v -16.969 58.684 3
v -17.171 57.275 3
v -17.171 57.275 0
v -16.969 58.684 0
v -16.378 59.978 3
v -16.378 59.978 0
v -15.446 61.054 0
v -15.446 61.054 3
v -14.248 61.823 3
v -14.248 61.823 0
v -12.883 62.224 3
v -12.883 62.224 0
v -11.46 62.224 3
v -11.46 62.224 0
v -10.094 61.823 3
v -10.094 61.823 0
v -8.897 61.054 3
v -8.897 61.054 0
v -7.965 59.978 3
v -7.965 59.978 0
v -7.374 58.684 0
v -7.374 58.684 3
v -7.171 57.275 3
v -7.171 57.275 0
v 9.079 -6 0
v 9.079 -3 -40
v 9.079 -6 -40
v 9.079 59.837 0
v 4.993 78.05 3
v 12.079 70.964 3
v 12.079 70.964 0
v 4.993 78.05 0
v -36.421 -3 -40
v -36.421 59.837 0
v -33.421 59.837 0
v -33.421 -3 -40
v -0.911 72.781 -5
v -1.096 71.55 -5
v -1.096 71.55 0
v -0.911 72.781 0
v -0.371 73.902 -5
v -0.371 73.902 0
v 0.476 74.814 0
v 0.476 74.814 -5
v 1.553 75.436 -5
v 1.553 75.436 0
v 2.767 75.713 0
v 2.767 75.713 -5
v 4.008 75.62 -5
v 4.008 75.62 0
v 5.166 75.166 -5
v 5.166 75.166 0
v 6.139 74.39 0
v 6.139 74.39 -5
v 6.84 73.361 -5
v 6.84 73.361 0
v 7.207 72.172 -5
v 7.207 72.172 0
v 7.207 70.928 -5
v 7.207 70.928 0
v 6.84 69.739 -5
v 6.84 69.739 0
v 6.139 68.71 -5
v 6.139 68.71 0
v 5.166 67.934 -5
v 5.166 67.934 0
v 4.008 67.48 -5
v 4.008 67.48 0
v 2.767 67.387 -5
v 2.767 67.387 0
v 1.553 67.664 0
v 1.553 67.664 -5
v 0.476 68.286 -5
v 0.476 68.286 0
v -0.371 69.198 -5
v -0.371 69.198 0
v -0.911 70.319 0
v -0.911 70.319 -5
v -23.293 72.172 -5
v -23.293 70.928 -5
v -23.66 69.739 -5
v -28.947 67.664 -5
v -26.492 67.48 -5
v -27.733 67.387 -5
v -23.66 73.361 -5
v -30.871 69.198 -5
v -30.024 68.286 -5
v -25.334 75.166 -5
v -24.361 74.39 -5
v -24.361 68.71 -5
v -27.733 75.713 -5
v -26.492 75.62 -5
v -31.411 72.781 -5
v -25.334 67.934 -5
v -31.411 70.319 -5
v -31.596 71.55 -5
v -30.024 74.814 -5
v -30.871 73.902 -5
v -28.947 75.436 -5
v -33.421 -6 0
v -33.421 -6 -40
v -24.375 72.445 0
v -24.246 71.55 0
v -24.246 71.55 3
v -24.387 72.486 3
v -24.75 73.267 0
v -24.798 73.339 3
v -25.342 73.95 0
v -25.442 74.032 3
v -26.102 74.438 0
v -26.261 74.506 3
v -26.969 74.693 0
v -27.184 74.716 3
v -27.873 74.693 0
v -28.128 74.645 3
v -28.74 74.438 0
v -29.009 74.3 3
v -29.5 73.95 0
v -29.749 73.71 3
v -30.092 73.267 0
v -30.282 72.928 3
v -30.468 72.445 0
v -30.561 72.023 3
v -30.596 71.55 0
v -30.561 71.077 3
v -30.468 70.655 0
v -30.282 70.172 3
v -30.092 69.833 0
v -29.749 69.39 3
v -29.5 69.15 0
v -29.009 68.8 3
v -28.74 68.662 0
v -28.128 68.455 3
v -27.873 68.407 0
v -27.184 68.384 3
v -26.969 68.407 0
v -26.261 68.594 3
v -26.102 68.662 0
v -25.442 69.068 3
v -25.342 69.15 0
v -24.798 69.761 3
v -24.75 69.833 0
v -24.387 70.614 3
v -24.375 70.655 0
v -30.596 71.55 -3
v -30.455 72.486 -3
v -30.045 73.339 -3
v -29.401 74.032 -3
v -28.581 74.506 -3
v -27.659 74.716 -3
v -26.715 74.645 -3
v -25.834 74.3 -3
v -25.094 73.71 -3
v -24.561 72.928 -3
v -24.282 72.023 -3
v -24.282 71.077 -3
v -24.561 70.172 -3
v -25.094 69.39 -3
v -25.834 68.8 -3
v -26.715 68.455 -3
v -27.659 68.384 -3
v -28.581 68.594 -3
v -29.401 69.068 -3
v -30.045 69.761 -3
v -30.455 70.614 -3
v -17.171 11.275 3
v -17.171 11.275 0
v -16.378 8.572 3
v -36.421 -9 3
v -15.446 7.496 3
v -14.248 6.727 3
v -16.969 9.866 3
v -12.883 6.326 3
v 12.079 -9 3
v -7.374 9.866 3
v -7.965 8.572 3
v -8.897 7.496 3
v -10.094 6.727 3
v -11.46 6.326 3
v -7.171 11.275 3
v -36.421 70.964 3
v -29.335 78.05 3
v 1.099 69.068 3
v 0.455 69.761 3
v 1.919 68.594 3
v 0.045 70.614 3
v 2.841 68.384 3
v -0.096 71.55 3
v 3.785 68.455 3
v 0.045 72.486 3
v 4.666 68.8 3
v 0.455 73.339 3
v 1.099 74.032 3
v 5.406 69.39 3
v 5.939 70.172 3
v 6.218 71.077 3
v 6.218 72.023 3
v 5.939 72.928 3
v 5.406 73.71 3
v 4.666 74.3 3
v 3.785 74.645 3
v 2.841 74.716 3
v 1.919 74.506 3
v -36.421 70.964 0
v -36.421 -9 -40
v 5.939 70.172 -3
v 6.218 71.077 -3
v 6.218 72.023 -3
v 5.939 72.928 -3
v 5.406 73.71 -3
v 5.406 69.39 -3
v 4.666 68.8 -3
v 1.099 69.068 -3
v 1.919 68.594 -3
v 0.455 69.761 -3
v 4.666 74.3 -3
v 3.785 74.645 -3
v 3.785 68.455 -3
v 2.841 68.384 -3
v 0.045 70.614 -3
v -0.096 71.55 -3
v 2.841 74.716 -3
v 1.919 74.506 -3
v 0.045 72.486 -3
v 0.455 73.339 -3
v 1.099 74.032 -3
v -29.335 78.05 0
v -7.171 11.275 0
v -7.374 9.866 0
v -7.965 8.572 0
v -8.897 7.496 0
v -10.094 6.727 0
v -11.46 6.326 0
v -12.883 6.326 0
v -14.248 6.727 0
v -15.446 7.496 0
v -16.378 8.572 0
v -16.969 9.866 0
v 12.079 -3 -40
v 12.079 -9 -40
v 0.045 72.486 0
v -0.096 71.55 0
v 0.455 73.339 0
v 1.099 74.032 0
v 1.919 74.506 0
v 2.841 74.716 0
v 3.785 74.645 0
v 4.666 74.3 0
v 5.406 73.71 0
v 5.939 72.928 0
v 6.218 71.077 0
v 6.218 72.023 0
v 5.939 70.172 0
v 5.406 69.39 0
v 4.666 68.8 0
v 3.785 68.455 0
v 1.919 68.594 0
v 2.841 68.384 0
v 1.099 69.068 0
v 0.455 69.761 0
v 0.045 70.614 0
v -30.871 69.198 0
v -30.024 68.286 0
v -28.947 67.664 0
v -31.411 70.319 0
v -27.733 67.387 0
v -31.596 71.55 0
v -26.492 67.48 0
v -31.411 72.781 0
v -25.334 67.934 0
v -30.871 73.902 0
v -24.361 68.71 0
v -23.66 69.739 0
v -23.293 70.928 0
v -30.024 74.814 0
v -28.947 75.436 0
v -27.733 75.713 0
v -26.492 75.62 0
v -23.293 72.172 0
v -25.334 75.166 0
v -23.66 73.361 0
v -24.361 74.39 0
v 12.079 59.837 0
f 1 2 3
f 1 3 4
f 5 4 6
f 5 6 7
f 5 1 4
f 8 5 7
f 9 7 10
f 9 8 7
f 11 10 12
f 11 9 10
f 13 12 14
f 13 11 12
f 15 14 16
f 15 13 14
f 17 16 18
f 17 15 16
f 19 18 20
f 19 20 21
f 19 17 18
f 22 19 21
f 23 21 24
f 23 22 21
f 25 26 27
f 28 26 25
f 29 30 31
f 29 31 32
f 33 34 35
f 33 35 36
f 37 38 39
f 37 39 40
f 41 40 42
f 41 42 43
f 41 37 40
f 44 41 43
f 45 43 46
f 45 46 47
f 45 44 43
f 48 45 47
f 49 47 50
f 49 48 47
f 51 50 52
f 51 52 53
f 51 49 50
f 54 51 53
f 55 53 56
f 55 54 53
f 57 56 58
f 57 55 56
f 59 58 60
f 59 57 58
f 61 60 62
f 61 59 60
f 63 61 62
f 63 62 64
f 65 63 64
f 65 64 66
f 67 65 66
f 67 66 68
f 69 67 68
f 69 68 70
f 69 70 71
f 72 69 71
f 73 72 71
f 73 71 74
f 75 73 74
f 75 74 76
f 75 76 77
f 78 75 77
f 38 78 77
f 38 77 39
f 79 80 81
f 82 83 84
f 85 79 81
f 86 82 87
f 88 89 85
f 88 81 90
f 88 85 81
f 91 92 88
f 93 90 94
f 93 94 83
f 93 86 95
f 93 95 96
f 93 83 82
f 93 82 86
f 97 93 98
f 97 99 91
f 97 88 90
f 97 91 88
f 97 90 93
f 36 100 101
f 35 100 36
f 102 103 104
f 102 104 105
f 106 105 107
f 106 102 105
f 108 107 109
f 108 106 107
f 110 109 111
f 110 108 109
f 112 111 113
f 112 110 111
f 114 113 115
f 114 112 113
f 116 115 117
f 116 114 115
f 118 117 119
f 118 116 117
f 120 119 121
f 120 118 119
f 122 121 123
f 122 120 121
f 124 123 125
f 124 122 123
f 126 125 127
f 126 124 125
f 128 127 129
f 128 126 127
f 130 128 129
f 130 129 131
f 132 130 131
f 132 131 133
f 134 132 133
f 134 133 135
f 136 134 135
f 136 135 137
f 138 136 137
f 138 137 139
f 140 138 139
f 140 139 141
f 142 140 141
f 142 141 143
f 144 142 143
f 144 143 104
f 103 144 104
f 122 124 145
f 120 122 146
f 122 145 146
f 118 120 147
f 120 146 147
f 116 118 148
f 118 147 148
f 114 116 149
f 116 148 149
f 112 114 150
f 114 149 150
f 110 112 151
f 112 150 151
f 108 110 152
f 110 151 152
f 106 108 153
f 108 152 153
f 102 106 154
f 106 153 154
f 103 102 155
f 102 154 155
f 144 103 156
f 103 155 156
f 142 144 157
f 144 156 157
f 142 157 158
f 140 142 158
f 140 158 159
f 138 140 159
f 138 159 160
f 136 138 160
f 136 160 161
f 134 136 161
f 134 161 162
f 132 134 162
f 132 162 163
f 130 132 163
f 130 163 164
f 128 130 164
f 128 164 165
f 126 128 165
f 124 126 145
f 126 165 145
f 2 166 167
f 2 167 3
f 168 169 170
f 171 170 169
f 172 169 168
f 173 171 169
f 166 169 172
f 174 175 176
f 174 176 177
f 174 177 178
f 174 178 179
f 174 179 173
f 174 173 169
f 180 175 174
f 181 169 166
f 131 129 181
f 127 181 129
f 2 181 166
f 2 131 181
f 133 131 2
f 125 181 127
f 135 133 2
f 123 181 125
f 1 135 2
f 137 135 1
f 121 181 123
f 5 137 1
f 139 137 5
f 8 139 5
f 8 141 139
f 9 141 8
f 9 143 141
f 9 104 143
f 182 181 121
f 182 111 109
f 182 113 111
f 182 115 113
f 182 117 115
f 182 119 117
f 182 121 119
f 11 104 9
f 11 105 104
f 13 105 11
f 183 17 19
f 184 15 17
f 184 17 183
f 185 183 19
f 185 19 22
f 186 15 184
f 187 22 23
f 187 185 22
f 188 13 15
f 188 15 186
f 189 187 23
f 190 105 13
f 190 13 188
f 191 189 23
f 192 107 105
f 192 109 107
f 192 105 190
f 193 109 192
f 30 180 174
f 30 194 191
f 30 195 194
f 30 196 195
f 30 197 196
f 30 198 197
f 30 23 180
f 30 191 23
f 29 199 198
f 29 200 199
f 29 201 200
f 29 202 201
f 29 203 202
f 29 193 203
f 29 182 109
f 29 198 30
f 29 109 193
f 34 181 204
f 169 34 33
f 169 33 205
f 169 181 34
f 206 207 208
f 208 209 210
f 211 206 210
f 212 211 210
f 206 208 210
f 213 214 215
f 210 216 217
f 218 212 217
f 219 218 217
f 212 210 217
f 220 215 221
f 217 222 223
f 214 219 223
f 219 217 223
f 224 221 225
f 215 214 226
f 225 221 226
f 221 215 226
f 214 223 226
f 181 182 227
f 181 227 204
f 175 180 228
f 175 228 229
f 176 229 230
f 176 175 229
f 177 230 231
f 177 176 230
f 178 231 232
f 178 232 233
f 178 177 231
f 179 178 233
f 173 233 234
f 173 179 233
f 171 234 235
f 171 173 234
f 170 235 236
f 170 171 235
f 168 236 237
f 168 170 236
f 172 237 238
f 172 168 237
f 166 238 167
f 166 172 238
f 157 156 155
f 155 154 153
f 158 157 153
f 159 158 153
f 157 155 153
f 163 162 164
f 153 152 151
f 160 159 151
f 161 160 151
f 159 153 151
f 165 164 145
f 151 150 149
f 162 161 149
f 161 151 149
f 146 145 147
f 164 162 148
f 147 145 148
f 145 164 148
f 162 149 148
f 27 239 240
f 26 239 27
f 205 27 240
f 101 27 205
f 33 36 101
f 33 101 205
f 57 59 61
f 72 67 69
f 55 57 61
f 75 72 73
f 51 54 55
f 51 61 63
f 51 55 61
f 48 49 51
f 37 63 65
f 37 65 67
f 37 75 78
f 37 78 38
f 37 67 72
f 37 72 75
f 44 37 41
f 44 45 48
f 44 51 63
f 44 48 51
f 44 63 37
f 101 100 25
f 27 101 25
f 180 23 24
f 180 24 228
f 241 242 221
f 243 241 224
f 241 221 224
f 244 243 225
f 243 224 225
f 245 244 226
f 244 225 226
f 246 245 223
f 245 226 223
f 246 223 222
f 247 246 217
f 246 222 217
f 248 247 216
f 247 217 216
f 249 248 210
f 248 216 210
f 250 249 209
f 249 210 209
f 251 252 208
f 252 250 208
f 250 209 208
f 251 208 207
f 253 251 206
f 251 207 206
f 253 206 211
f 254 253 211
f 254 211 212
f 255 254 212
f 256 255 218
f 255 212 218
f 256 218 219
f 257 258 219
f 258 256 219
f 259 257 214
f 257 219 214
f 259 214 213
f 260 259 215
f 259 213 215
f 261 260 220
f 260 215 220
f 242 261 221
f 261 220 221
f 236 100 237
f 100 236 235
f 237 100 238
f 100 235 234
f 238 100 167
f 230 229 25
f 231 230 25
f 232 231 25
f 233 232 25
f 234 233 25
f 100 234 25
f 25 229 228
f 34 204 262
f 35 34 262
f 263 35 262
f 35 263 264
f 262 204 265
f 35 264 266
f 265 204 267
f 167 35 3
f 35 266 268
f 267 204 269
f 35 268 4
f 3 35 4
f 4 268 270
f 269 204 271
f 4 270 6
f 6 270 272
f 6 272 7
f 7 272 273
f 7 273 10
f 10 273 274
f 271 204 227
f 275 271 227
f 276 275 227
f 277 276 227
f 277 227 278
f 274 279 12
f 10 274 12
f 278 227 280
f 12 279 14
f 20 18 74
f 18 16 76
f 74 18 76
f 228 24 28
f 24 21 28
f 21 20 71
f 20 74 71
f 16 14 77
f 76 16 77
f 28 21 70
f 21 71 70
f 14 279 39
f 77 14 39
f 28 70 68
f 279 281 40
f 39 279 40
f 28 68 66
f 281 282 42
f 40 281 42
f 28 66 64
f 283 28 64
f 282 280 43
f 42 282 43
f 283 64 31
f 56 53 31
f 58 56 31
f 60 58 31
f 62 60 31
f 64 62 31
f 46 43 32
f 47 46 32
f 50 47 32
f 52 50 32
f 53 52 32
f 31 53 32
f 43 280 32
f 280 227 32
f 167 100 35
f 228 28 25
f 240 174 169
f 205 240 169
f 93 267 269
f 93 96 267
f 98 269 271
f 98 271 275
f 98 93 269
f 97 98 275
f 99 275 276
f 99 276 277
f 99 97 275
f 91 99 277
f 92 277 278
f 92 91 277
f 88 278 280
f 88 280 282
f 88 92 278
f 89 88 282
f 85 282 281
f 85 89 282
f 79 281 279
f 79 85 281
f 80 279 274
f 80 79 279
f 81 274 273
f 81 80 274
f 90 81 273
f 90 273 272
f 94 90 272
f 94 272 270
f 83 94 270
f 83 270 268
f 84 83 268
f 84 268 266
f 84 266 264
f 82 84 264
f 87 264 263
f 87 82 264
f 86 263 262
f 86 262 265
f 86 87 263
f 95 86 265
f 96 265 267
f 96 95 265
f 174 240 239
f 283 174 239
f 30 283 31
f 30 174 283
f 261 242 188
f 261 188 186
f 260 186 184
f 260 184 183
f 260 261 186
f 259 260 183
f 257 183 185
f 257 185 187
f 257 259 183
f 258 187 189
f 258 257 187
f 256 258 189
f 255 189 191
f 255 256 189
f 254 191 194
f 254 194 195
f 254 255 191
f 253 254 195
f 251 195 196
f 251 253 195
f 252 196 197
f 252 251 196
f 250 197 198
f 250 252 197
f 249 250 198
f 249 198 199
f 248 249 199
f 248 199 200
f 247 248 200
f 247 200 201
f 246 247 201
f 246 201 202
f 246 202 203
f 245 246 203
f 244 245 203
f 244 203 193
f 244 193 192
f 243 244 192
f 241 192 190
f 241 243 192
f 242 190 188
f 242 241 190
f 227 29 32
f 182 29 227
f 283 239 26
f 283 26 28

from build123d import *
from build123d.topology import SkipClean

# Parameters (mm, degrees)
SKETCH1_R                = 1.55
SKETCH1_R_2              = 1.5
SKETCH1_R_3              = 11
SKETCH1_R_4              = 3.175
BOSS_EXTRUDE1_DEPTH      = 3
BOSS_EXTRUDE2_START      = 3
SKETCH2_R                = 4.175
SKETCH2_R_2              = 3.175
BOSS_EXTRUDE2_DEPTH      = 3
BOSS_EXTRUDE3_START      = 2
SKETCH3_R                = 4.175
BOSS_EXTRUDE3_DEPTH      = 2
BOSS_EXTRUDE4_DEPTH      = 40
BOSS_EXTRUDE4_DEPTH_BACK = 3
SKETCH5_W                = 3
SKETCH5_H                = 5
BOSS_EXTRUDE5_DEPTH      = 3
BOSS_EXTRUDE7_DEPTH      = 3
BOSS_EXTRUDE9_DEPTH      = 3
BOSS_EXTRUDE10_START     = -3
SKETCH9_R                = 1.55
SKETCH9_R_2              = 1.5
SKETCH9_R_3              = 11
BOSS_EXTRUDE10_DEPTH     = 3
CUT_EXTRUDE1_DEPTH       = 3
SKETCH11_W               = 3
SKETCH11_H               = 75.55
BOSS_EXTRUDE11_DEPTH     = 3
CHAMFER1_SIZE            = 3
BOSS_EXTRUDE12_DEPTH     = 3
BOSS_EXTRUDE13_DEPTH     = 3
BOSS_EXTRUDE14_DEPTH     = 3


with BuildPart() as part:
    # Sketch1 → Boss-Extrude1 (new body)
    with BuildSketch(Plane.XY):
        Polygon((-33.421286346, -6), (-33.421286346, 36.5), (-33.421286346, 72.55), (-28.421286346, 77.55), (4.078713654, 77.55), (9.078713654, 72.55), (9.078713654, 36.5), (9.078713654, -6), align=None)
        with Locations((2.92772434, 30.5)):
            Circle(SKETCH1_R, mode=Mode.SUBTRACT)
        with Locations(Location((2.92772434, -0.5, 0), (0, 0, 180))):
            Circle(SKETCH1_R_2, mode=Mode.SUBTRACT)
        with Locations((-27.671286346, -0.5)):
            Circle(SKETCH1_R_2, mode=Mode.SUBTRACT)
        with Locations(Location((-28.07227566, 30.5, 0), (0, 0, 180))):
            Circle(SKETCH1_R_2, mode=Mode.SUBTRACT)
        with Locations((-12.171286346, 15.25)):
            Circle(SKETCH1_R_3, mode=Mode.SUBTRACT)
        with Locations((-27.421286346, 71.55)):
            Circle(SKETCH1_R_4, mode=Mode.SUBTRACT)
        with Locations(Location((3.078713654, 71.55, 0), (0, 0, 180))):
            Circle(SKETCH1_R_4, mode=Mode.SUBTRACT)
    extrude(amount=BOSS_EXTRUDE1_DEPTH)

    # Sketch2 → Boss-Extrude2 (add)
    # profile 1 of 2: a face of its own
    with SkipClean():  # the faces are left unmerged after this step: merging them gives an invalid solid
        with BuildSketch(Plane(origin=(0, 0, 0), x_dir=(-1, 0, 0), z_dir=(0, 0, -1)).offset(BOSS_EXTRUDE2_START)):
            with Locations((-3.078713654, 71.55)):
                Circle(SKETCH2_R)
            with Locations((-3.078713654, 71.55)):
                Circle(SKETCH2_R_2, mode=Mode.SUBTRACT)
        # profile 2 of 2: a face of its own
        with BuildSketch(Plane(origin=(0, 0, 0), x_dir=(-1, 0, 0), z_dir=(0, 0, -1)).offset(BOSS_EXTRUDE2_START)):
            with Locations((27.421286346, 71.55)):
                Circle(SKETCH2_R)
            with Locations((27.421286346, 71.55)):
                Circle(SKETCH2_R_2, mode=Mode.SUBTRACT)
        extrude(amount=-BOSS_EXTRUDE2_DEPTH)

    # Sketch3 → Boss-Extrude3 (add)
    with SkipClean():  # the faces are left unmerged after this step: merging them gives an invalid solid
        with BuildSketch(Plane(origin=(0, 0, -3), x_dir=(-1, 0, 0), z_dir=(0, 0, -1)).offset(BOSS_EXTRUDE3_START)):
            with Locations((-3.078713654, 71.55)):
                Circle(SKETCH3_R)
            with Locations((27.421286346, 71.55)):
                Circle(SKETCH3_R)
        extrude(amount=-BOSS_EXTRUDE3_DEPTH)

    # Sketch5 → Boss-Extrude5 (add)
    with SkipClean():  # the faces are left unmerged after this step: merging them gives an invalid solid
        with BuildSketch(Plane.XY.offset(3)):
            with Locations((10.578713654, 45.531399611)):
                Rectangle(SKETCH5_W, SKETCH5_H)
            with Locations((-34.921286346, 45.531399611)):
                Rectangle(SKETCH5_W, SKETCH5_H)
        extrude(amount=-BOSS_EXTRUDE5_DEPTH)



with BuildPart() as body_2:
    # Sketch4 → Boss-Extrude4 (new, two sides: drawn at the far end of the back side and taken through both)
    with BuildSketch(Plane(origin=(0, 0, 0), x_dir=(-1, 0, 0), z_dir=(0, 0, -1)).offset(-BOSS_EXTRUDE4_DEPTH_BACK)):
        Polygon((33.421286346, -6), (-9.078713654, -6), (-9.078713654, -3), (-12.078713654, -3), (-12.078713654, -9), (-9.078713654, -9), (34.421286346, -9), (36.421286346, -9), (36.421286346, -3), (33.421286346, -3), align=None)
    extrude(amount=BOSS_EXTRUDE4_DEPTH + BOSS_EXTRUDE4_DEPTH_BACK)


with BuildPart() as part_1:
    with SkipClean():  # the faces are left unmerged after this step: merging them gives an invalid solid
        add(part.part)

        add(body_2.part)  # Boss-Extrude7 merges body 2
        # Sketch6 → Boss-Extrude7 (add)
        with BuildSketch(Plane(origin=(9.078713654, 0, 0), x_dir=(0, 0, -1), z_dir=(1, 0, 0))):
            Polygon((0, 48.031399611), (40, -3), (36.080844313, -3), (0, 43.031399611), align=None)
        extrude(amount=BOSS_EXTRUDE7_DEPTH)

    # Sketch8 → Boss-Extrude9 (add)
    with SkipClean():  # the faces are left unmerged after this step: merging them gives an invalid solid
        with BuildSketch(Plane.ZY.offset(36.421286346)):
            Polygon((0, 48.031399611), (0, 43.031399611), (-36.080844313, -3), (-40, -3), align=None)
        extrude(amount=-BOSS_EXTRUDE9_DEPTH)

    # Sketch9 → Boss-Extrude10 (add)
    with SkipClean():  # the faces are left unmerged after this step: merging them gives an invalid solid
        with BuildSketch(Plane.XY.offset(3).offset(BOSS_EXTRUDE10_START)):
            with Locations((2.92772434, 30.5)):
                Circle(SKETCH9_R)
            with Locations((-28.07227566, 30.5)):
                Circle(SKETCH9_R_2)
            with Locations((-27.671286346, -0.5)):
                Circle(SKETCH9_R_2)
            with Locations((2.92772434, -0.5)):
                Circle(SKETCH9_R_2)
            with Locations((-12.171286346, 15.25)):
                Circle(SKETCH9_R_3)
        extrude(amount=BOSS_EXTRUDE10_DEPTH)

    # Sketch10 → Cut-Extrude1 (cut)
    with BuildSketch(Plane.XY.offset(3)):
        with BuildLine():
            Line((-7.171286346, 57.275), (-7.171286346, 11.275))
            ThreePointArc((-7.171286346, 11.275), (-12.171286346, 6.275), (-17.171286346, 11.275))
            Line((-17.171286346, 11.275), (-17.171286346, 57.275))
            ThreePointArc((-17.171286346, 57.275), (-12.171286346, 62.275), (-7.171286346, 57.275))
        make_face()
    extrude(amount=-CUT_EXTRUDE1_DEPTH, mode=Mode.SUBTRACT)

    # Sketch11 → Boss-Extrude11 (add)
    with BuildSketch(Plane.XY.offset(3)):
        with Locations((-34.921286346, 34.775)):
            Rectangle(SKETCH11_W, SKETCH11_H)
        with Locations((10.578713654, 34.775)):
            Rectangle(SKETCH11_W, SKETCH11_H)
    extrude(amount=-BOSS_EXTRUDE11_DEPTH)

    # Chamfer1
    chamfer1_edges = [part_1.edges().sort_by_distance(p)[0] for p in [
        (-36.421286346, 72.55, 1.5),
        (12.078713654, 72.55, 1.5),
    ]]
    chamfer(chamfer1_edges, length=CHAMFER1_SIZE - 0.0001)  # a hair under: the kernel refuses the full size

    # Sketch12 → Boss-Extrude12 (add)
    with BuildSketch(Plane(origin=(12.078713654, 0, 0), x_dir=(0, 0, -1), z_dir=(1, 0, 0))):
        Polygon((-3, 64.55), (-3, -9), (40, -9), (40, -3), align=None)
    extrude(amount=-BOSS_EXTRUDE12_DEPTH)

    # Sketch13 → Boss-Extrude13 (add)
    with BuildSketch(Plane.ZY.offset(36.421286346)):
        Polygon((3, -9), (3, 64.55), (-40, -3), (-40, -9), align=None)
    extrude(amount=-BOSS_EXTRUDE13_DEPTH)

    # Sketch14 → Boss-Extrude14 (add)
    with BuildSketch(Plane.XY.offset(3)):
        Polygon((-36.421286346, 70.964213562), (-36.421286346, 69.55), (-28.421286346, 77.55), (4.078713654, 77.55), (12.078713654, 69.55), (12.078713654, 70.964213562), (4.992927216, 78.05), (-29.335499908, 78.05), align=None)
    extrude(amount=-BOSS_EXTRUDE14_DEPTH)


solid = part_1.part
